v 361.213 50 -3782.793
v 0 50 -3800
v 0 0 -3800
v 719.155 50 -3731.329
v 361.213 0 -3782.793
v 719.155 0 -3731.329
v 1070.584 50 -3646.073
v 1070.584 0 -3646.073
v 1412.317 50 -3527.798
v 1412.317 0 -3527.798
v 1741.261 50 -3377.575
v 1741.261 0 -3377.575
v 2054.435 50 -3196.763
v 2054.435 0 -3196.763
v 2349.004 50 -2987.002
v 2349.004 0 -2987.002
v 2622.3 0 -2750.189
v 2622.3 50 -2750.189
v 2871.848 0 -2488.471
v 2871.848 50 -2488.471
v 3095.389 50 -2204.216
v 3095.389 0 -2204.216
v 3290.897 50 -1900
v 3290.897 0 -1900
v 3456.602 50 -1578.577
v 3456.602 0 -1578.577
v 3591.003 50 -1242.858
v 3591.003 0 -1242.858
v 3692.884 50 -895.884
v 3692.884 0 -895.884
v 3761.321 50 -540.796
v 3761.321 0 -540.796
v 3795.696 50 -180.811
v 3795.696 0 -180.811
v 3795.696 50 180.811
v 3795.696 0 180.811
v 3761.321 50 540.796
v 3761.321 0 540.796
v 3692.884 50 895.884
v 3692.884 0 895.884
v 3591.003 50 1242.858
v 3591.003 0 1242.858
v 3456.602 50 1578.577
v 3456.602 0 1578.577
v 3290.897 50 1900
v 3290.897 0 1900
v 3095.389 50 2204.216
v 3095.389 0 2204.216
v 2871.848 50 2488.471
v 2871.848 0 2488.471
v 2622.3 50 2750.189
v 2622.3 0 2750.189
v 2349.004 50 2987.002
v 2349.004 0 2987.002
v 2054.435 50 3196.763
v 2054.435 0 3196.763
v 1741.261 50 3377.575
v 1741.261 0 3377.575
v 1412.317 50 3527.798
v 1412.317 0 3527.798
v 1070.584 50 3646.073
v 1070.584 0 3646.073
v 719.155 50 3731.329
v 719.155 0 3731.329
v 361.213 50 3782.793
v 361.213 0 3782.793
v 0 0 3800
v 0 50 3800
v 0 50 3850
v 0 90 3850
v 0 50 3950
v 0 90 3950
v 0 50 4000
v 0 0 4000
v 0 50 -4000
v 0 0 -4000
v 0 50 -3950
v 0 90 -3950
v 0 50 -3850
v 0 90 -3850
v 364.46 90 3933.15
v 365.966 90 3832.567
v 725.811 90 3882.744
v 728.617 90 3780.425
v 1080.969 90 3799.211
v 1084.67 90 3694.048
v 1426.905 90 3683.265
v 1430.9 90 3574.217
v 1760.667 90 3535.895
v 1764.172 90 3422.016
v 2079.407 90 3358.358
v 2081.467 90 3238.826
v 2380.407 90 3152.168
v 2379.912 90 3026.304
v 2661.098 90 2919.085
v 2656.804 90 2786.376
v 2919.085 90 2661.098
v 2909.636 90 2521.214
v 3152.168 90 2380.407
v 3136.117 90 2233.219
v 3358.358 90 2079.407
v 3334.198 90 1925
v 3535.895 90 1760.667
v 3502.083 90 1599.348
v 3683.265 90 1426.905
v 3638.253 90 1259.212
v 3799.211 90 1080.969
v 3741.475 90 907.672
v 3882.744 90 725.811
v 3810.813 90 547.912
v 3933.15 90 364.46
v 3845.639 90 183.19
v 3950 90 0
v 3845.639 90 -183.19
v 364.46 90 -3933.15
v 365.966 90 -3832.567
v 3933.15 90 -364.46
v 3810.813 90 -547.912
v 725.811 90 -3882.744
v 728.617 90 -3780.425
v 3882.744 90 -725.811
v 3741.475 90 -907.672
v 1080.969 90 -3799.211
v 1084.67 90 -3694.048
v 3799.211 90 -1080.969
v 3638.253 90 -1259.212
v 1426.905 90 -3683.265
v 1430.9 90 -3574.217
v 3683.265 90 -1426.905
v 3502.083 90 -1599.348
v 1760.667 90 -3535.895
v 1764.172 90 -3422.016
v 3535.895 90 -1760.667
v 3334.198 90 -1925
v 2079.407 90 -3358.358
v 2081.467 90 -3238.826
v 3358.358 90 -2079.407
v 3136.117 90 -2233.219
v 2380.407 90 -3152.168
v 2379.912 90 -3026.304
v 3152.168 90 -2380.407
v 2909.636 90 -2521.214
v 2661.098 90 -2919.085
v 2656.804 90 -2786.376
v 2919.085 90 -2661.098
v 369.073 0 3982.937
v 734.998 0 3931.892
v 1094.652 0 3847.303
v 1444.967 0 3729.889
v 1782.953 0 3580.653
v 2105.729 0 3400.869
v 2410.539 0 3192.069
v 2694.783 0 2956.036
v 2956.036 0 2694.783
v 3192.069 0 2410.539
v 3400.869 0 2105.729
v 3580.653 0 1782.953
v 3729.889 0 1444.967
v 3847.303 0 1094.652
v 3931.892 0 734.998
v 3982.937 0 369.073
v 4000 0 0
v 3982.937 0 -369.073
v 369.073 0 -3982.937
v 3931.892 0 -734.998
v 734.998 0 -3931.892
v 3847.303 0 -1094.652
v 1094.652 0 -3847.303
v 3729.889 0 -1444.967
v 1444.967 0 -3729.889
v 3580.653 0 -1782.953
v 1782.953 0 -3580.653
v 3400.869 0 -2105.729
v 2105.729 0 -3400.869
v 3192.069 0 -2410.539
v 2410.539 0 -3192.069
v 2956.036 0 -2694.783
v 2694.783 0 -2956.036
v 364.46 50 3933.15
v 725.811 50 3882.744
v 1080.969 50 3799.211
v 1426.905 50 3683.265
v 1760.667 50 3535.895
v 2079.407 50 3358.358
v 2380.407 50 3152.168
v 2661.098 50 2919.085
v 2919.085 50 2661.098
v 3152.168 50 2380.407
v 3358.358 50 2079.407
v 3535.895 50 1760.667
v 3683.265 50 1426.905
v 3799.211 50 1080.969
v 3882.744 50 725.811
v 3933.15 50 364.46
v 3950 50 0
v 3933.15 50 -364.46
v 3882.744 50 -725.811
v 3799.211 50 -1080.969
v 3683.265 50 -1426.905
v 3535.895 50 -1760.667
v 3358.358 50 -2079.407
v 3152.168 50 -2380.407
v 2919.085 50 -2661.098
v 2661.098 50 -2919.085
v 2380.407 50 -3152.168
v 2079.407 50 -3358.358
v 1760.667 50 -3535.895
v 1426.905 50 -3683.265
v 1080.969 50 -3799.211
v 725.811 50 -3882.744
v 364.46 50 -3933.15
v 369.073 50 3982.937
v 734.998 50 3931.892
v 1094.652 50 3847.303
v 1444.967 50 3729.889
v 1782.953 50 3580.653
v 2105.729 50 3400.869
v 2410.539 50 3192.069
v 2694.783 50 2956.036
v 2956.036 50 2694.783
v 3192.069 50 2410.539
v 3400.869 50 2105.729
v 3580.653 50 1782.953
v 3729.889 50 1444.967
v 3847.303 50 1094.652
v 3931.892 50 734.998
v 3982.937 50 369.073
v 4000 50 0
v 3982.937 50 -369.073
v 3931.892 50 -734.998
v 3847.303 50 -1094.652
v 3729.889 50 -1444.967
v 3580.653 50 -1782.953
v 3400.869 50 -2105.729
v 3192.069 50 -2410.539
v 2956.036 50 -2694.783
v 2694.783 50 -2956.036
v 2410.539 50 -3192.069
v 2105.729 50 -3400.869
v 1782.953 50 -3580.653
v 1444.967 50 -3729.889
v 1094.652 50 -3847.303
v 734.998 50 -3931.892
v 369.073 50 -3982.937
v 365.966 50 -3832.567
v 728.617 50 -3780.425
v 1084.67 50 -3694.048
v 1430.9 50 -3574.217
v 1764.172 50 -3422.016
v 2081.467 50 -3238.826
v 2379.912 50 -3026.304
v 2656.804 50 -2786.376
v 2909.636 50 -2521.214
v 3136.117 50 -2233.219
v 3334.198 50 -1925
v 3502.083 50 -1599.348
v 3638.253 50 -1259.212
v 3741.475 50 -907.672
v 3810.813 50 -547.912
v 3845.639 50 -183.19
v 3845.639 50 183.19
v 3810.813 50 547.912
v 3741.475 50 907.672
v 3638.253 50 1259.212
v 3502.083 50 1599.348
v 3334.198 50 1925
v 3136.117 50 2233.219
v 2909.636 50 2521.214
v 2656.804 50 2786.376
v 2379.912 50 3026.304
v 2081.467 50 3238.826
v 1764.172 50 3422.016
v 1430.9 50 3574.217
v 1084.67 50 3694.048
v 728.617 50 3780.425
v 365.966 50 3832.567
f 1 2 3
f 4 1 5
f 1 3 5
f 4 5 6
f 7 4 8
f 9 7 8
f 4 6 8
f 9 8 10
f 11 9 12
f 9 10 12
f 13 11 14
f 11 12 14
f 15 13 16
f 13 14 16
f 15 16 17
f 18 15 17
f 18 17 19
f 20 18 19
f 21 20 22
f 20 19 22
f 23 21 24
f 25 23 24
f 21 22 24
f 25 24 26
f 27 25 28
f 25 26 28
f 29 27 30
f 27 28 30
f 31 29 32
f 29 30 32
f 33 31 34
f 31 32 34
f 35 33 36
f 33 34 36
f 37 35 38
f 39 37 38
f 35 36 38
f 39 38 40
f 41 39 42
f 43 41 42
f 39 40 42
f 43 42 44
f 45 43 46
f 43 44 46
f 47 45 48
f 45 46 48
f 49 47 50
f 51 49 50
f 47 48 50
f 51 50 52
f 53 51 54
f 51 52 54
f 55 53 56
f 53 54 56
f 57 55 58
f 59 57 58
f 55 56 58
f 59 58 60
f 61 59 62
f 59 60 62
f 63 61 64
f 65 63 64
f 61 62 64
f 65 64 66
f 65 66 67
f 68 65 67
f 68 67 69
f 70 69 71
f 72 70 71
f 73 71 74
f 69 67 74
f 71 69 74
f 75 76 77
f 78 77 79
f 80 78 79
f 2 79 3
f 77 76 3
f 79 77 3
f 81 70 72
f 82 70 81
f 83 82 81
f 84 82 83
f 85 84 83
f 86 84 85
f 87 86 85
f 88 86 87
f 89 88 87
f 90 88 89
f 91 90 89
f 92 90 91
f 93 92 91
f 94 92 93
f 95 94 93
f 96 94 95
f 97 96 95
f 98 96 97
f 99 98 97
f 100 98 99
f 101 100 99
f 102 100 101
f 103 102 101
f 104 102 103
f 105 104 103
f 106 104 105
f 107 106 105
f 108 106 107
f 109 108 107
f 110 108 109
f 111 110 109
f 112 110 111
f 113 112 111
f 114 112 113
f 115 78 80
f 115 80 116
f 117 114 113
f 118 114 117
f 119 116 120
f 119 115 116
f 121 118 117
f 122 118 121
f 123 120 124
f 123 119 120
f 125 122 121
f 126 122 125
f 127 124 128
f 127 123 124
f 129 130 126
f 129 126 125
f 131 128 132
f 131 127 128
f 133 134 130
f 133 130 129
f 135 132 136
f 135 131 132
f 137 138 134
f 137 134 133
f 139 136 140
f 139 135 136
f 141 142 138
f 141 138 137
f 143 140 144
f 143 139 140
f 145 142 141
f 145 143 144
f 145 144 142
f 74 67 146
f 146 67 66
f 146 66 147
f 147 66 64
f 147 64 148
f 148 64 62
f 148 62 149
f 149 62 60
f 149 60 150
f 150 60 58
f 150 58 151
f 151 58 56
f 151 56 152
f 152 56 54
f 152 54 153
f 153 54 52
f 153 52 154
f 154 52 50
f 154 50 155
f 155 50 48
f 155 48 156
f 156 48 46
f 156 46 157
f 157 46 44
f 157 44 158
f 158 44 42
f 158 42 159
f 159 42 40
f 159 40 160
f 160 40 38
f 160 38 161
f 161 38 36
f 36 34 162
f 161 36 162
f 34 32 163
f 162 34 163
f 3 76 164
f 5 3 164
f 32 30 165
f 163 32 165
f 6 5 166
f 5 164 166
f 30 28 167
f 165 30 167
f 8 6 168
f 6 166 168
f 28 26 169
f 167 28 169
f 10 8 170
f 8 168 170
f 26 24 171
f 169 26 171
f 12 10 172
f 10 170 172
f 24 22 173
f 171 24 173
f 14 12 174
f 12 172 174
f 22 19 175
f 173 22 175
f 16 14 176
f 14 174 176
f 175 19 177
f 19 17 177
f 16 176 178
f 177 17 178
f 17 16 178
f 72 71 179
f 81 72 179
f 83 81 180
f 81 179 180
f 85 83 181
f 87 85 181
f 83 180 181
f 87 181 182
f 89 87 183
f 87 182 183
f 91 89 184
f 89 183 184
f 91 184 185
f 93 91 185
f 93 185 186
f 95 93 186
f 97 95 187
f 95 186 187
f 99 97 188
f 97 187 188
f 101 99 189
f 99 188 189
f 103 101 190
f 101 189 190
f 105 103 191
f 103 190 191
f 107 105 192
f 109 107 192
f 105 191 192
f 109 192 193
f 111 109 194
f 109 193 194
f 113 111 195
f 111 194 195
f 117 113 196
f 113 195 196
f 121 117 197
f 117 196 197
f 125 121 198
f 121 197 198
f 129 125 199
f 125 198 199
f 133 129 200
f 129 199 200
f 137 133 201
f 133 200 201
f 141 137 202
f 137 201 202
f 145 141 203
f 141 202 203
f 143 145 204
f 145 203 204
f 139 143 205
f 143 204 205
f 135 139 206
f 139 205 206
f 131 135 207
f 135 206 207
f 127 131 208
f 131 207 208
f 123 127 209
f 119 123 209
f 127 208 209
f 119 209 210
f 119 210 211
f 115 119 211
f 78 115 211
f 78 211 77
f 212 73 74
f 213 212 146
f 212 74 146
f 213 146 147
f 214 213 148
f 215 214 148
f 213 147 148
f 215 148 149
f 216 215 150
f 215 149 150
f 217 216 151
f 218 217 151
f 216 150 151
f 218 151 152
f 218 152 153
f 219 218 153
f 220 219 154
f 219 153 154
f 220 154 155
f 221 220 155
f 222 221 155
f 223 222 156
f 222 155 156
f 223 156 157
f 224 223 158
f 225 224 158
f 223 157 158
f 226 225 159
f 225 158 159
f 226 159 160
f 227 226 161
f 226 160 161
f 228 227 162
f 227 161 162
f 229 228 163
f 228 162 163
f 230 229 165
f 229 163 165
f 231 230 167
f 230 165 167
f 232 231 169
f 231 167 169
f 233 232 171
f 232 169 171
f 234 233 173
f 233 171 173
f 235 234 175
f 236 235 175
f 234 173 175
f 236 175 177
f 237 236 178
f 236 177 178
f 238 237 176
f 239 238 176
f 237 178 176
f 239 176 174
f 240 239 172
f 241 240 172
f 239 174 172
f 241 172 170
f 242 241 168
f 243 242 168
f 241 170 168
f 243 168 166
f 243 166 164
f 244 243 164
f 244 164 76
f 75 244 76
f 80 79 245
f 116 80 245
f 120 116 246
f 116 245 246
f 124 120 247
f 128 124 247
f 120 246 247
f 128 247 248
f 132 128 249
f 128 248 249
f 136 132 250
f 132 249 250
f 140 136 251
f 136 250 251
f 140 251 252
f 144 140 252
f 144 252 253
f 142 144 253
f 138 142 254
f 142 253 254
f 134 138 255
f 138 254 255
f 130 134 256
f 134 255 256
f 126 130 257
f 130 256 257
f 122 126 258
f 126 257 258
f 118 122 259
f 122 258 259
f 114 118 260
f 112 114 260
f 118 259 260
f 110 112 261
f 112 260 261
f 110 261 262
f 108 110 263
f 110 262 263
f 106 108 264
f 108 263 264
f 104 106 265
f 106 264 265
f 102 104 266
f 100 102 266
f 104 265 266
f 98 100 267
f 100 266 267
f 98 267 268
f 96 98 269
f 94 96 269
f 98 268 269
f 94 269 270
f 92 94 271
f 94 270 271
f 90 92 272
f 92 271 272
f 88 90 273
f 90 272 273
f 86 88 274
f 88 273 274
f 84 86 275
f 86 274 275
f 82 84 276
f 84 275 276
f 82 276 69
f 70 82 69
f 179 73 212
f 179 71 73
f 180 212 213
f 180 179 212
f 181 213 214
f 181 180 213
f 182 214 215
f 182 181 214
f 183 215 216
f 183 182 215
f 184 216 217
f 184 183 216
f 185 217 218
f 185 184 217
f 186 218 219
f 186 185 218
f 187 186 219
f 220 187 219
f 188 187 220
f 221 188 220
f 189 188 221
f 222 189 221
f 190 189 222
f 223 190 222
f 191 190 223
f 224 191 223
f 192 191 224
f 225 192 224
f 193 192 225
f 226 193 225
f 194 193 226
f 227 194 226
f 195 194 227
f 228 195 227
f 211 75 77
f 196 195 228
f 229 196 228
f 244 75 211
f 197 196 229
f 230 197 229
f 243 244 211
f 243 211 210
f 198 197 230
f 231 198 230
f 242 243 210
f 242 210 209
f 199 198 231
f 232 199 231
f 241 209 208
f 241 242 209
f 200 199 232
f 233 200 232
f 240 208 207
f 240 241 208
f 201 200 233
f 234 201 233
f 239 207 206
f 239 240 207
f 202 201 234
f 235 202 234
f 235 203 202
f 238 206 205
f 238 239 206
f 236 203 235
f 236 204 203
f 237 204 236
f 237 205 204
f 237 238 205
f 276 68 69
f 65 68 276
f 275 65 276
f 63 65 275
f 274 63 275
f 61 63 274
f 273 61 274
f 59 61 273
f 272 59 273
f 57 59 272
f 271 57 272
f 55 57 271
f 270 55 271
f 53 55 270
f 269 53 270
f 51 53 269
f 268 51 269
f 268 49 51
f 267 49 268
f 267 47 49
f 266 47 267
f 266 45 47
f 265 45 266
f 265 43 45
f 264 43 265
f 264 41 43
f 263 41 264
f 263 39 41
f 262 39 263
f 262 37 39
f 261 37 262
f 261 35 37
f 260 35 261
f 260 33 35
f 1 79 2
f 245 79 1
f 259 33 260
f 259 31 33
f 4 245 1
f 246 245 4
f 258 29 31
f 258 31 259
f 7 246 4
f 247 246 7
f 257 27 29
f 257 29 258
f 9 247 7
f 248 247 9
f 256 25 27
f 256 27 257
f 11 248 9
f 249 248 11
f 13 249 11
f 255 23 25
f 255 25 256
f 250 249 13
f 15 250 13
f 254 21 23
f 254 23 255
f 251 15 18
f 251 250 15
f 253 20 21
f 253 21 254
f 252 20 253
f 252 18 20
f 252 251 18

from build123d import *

# Parameters (mm, degrees)
BOSS_EXTRUDE1_DEPTH = 50
BOSS_EXTRUDE2_DEPTH = 40


with BuildPart() as part:
    # Sketch1 → Boss-Extrude1 (new body)
    with BuildSketch(Plane(origin=(0, 0, 0), x_dir=(1, 0, 0), z_dir=(0, 1, 0))):
        with BuildLine():
            ThreePointArc((4000, 0), (2828.427124746, 2828.427124746), (0, 4000))
            Line((0, 4000), (0, 3800))
            ThreePointArc((0, 3800), (2687.005768509, 2687.005768509), (3800, 0))
            ThreePointArc((3800, 0), (2687.005768509, -2687.005768509), (0, -3800))
            Line((0, -3800), (0, -4000))
            ThreePointArc((0, -4000), (2828.427124746, -2828.427124746), (4000, 0))
        make_face()
    extrude(amount=BOSS_EXTRUDE1_DEPTH)

    # Sketch2 → Boss-Extrude2 (add)
    with BuildSketch(Plane(origin=(0, 50, 0), x_dir=(1, 0, 0), z_dir=(0, 1, 0))):
        with BuildLine():
            ThreePointArc((3950, 0), (2793.071785687, 2793.071785687), (0, 3950))
            Line((0, 3950), (0, 3850))
            ThreePointArc((0, 3850), (2722.361107568, 2722.361107568), (3850, 0))
            ThreePointArc((3850, 0), (2722.361107568, -2722.361107568), (0, -3850))
            Line((0, -3850), (0, -3950))
            ThreePointArc((0, -3950), (2793.071785687, -2793.071785687), (3950, 0))
        make_face()
    extrude(amount=BOSS_EXTRUDE2_DEPTH)


solid = part.part
